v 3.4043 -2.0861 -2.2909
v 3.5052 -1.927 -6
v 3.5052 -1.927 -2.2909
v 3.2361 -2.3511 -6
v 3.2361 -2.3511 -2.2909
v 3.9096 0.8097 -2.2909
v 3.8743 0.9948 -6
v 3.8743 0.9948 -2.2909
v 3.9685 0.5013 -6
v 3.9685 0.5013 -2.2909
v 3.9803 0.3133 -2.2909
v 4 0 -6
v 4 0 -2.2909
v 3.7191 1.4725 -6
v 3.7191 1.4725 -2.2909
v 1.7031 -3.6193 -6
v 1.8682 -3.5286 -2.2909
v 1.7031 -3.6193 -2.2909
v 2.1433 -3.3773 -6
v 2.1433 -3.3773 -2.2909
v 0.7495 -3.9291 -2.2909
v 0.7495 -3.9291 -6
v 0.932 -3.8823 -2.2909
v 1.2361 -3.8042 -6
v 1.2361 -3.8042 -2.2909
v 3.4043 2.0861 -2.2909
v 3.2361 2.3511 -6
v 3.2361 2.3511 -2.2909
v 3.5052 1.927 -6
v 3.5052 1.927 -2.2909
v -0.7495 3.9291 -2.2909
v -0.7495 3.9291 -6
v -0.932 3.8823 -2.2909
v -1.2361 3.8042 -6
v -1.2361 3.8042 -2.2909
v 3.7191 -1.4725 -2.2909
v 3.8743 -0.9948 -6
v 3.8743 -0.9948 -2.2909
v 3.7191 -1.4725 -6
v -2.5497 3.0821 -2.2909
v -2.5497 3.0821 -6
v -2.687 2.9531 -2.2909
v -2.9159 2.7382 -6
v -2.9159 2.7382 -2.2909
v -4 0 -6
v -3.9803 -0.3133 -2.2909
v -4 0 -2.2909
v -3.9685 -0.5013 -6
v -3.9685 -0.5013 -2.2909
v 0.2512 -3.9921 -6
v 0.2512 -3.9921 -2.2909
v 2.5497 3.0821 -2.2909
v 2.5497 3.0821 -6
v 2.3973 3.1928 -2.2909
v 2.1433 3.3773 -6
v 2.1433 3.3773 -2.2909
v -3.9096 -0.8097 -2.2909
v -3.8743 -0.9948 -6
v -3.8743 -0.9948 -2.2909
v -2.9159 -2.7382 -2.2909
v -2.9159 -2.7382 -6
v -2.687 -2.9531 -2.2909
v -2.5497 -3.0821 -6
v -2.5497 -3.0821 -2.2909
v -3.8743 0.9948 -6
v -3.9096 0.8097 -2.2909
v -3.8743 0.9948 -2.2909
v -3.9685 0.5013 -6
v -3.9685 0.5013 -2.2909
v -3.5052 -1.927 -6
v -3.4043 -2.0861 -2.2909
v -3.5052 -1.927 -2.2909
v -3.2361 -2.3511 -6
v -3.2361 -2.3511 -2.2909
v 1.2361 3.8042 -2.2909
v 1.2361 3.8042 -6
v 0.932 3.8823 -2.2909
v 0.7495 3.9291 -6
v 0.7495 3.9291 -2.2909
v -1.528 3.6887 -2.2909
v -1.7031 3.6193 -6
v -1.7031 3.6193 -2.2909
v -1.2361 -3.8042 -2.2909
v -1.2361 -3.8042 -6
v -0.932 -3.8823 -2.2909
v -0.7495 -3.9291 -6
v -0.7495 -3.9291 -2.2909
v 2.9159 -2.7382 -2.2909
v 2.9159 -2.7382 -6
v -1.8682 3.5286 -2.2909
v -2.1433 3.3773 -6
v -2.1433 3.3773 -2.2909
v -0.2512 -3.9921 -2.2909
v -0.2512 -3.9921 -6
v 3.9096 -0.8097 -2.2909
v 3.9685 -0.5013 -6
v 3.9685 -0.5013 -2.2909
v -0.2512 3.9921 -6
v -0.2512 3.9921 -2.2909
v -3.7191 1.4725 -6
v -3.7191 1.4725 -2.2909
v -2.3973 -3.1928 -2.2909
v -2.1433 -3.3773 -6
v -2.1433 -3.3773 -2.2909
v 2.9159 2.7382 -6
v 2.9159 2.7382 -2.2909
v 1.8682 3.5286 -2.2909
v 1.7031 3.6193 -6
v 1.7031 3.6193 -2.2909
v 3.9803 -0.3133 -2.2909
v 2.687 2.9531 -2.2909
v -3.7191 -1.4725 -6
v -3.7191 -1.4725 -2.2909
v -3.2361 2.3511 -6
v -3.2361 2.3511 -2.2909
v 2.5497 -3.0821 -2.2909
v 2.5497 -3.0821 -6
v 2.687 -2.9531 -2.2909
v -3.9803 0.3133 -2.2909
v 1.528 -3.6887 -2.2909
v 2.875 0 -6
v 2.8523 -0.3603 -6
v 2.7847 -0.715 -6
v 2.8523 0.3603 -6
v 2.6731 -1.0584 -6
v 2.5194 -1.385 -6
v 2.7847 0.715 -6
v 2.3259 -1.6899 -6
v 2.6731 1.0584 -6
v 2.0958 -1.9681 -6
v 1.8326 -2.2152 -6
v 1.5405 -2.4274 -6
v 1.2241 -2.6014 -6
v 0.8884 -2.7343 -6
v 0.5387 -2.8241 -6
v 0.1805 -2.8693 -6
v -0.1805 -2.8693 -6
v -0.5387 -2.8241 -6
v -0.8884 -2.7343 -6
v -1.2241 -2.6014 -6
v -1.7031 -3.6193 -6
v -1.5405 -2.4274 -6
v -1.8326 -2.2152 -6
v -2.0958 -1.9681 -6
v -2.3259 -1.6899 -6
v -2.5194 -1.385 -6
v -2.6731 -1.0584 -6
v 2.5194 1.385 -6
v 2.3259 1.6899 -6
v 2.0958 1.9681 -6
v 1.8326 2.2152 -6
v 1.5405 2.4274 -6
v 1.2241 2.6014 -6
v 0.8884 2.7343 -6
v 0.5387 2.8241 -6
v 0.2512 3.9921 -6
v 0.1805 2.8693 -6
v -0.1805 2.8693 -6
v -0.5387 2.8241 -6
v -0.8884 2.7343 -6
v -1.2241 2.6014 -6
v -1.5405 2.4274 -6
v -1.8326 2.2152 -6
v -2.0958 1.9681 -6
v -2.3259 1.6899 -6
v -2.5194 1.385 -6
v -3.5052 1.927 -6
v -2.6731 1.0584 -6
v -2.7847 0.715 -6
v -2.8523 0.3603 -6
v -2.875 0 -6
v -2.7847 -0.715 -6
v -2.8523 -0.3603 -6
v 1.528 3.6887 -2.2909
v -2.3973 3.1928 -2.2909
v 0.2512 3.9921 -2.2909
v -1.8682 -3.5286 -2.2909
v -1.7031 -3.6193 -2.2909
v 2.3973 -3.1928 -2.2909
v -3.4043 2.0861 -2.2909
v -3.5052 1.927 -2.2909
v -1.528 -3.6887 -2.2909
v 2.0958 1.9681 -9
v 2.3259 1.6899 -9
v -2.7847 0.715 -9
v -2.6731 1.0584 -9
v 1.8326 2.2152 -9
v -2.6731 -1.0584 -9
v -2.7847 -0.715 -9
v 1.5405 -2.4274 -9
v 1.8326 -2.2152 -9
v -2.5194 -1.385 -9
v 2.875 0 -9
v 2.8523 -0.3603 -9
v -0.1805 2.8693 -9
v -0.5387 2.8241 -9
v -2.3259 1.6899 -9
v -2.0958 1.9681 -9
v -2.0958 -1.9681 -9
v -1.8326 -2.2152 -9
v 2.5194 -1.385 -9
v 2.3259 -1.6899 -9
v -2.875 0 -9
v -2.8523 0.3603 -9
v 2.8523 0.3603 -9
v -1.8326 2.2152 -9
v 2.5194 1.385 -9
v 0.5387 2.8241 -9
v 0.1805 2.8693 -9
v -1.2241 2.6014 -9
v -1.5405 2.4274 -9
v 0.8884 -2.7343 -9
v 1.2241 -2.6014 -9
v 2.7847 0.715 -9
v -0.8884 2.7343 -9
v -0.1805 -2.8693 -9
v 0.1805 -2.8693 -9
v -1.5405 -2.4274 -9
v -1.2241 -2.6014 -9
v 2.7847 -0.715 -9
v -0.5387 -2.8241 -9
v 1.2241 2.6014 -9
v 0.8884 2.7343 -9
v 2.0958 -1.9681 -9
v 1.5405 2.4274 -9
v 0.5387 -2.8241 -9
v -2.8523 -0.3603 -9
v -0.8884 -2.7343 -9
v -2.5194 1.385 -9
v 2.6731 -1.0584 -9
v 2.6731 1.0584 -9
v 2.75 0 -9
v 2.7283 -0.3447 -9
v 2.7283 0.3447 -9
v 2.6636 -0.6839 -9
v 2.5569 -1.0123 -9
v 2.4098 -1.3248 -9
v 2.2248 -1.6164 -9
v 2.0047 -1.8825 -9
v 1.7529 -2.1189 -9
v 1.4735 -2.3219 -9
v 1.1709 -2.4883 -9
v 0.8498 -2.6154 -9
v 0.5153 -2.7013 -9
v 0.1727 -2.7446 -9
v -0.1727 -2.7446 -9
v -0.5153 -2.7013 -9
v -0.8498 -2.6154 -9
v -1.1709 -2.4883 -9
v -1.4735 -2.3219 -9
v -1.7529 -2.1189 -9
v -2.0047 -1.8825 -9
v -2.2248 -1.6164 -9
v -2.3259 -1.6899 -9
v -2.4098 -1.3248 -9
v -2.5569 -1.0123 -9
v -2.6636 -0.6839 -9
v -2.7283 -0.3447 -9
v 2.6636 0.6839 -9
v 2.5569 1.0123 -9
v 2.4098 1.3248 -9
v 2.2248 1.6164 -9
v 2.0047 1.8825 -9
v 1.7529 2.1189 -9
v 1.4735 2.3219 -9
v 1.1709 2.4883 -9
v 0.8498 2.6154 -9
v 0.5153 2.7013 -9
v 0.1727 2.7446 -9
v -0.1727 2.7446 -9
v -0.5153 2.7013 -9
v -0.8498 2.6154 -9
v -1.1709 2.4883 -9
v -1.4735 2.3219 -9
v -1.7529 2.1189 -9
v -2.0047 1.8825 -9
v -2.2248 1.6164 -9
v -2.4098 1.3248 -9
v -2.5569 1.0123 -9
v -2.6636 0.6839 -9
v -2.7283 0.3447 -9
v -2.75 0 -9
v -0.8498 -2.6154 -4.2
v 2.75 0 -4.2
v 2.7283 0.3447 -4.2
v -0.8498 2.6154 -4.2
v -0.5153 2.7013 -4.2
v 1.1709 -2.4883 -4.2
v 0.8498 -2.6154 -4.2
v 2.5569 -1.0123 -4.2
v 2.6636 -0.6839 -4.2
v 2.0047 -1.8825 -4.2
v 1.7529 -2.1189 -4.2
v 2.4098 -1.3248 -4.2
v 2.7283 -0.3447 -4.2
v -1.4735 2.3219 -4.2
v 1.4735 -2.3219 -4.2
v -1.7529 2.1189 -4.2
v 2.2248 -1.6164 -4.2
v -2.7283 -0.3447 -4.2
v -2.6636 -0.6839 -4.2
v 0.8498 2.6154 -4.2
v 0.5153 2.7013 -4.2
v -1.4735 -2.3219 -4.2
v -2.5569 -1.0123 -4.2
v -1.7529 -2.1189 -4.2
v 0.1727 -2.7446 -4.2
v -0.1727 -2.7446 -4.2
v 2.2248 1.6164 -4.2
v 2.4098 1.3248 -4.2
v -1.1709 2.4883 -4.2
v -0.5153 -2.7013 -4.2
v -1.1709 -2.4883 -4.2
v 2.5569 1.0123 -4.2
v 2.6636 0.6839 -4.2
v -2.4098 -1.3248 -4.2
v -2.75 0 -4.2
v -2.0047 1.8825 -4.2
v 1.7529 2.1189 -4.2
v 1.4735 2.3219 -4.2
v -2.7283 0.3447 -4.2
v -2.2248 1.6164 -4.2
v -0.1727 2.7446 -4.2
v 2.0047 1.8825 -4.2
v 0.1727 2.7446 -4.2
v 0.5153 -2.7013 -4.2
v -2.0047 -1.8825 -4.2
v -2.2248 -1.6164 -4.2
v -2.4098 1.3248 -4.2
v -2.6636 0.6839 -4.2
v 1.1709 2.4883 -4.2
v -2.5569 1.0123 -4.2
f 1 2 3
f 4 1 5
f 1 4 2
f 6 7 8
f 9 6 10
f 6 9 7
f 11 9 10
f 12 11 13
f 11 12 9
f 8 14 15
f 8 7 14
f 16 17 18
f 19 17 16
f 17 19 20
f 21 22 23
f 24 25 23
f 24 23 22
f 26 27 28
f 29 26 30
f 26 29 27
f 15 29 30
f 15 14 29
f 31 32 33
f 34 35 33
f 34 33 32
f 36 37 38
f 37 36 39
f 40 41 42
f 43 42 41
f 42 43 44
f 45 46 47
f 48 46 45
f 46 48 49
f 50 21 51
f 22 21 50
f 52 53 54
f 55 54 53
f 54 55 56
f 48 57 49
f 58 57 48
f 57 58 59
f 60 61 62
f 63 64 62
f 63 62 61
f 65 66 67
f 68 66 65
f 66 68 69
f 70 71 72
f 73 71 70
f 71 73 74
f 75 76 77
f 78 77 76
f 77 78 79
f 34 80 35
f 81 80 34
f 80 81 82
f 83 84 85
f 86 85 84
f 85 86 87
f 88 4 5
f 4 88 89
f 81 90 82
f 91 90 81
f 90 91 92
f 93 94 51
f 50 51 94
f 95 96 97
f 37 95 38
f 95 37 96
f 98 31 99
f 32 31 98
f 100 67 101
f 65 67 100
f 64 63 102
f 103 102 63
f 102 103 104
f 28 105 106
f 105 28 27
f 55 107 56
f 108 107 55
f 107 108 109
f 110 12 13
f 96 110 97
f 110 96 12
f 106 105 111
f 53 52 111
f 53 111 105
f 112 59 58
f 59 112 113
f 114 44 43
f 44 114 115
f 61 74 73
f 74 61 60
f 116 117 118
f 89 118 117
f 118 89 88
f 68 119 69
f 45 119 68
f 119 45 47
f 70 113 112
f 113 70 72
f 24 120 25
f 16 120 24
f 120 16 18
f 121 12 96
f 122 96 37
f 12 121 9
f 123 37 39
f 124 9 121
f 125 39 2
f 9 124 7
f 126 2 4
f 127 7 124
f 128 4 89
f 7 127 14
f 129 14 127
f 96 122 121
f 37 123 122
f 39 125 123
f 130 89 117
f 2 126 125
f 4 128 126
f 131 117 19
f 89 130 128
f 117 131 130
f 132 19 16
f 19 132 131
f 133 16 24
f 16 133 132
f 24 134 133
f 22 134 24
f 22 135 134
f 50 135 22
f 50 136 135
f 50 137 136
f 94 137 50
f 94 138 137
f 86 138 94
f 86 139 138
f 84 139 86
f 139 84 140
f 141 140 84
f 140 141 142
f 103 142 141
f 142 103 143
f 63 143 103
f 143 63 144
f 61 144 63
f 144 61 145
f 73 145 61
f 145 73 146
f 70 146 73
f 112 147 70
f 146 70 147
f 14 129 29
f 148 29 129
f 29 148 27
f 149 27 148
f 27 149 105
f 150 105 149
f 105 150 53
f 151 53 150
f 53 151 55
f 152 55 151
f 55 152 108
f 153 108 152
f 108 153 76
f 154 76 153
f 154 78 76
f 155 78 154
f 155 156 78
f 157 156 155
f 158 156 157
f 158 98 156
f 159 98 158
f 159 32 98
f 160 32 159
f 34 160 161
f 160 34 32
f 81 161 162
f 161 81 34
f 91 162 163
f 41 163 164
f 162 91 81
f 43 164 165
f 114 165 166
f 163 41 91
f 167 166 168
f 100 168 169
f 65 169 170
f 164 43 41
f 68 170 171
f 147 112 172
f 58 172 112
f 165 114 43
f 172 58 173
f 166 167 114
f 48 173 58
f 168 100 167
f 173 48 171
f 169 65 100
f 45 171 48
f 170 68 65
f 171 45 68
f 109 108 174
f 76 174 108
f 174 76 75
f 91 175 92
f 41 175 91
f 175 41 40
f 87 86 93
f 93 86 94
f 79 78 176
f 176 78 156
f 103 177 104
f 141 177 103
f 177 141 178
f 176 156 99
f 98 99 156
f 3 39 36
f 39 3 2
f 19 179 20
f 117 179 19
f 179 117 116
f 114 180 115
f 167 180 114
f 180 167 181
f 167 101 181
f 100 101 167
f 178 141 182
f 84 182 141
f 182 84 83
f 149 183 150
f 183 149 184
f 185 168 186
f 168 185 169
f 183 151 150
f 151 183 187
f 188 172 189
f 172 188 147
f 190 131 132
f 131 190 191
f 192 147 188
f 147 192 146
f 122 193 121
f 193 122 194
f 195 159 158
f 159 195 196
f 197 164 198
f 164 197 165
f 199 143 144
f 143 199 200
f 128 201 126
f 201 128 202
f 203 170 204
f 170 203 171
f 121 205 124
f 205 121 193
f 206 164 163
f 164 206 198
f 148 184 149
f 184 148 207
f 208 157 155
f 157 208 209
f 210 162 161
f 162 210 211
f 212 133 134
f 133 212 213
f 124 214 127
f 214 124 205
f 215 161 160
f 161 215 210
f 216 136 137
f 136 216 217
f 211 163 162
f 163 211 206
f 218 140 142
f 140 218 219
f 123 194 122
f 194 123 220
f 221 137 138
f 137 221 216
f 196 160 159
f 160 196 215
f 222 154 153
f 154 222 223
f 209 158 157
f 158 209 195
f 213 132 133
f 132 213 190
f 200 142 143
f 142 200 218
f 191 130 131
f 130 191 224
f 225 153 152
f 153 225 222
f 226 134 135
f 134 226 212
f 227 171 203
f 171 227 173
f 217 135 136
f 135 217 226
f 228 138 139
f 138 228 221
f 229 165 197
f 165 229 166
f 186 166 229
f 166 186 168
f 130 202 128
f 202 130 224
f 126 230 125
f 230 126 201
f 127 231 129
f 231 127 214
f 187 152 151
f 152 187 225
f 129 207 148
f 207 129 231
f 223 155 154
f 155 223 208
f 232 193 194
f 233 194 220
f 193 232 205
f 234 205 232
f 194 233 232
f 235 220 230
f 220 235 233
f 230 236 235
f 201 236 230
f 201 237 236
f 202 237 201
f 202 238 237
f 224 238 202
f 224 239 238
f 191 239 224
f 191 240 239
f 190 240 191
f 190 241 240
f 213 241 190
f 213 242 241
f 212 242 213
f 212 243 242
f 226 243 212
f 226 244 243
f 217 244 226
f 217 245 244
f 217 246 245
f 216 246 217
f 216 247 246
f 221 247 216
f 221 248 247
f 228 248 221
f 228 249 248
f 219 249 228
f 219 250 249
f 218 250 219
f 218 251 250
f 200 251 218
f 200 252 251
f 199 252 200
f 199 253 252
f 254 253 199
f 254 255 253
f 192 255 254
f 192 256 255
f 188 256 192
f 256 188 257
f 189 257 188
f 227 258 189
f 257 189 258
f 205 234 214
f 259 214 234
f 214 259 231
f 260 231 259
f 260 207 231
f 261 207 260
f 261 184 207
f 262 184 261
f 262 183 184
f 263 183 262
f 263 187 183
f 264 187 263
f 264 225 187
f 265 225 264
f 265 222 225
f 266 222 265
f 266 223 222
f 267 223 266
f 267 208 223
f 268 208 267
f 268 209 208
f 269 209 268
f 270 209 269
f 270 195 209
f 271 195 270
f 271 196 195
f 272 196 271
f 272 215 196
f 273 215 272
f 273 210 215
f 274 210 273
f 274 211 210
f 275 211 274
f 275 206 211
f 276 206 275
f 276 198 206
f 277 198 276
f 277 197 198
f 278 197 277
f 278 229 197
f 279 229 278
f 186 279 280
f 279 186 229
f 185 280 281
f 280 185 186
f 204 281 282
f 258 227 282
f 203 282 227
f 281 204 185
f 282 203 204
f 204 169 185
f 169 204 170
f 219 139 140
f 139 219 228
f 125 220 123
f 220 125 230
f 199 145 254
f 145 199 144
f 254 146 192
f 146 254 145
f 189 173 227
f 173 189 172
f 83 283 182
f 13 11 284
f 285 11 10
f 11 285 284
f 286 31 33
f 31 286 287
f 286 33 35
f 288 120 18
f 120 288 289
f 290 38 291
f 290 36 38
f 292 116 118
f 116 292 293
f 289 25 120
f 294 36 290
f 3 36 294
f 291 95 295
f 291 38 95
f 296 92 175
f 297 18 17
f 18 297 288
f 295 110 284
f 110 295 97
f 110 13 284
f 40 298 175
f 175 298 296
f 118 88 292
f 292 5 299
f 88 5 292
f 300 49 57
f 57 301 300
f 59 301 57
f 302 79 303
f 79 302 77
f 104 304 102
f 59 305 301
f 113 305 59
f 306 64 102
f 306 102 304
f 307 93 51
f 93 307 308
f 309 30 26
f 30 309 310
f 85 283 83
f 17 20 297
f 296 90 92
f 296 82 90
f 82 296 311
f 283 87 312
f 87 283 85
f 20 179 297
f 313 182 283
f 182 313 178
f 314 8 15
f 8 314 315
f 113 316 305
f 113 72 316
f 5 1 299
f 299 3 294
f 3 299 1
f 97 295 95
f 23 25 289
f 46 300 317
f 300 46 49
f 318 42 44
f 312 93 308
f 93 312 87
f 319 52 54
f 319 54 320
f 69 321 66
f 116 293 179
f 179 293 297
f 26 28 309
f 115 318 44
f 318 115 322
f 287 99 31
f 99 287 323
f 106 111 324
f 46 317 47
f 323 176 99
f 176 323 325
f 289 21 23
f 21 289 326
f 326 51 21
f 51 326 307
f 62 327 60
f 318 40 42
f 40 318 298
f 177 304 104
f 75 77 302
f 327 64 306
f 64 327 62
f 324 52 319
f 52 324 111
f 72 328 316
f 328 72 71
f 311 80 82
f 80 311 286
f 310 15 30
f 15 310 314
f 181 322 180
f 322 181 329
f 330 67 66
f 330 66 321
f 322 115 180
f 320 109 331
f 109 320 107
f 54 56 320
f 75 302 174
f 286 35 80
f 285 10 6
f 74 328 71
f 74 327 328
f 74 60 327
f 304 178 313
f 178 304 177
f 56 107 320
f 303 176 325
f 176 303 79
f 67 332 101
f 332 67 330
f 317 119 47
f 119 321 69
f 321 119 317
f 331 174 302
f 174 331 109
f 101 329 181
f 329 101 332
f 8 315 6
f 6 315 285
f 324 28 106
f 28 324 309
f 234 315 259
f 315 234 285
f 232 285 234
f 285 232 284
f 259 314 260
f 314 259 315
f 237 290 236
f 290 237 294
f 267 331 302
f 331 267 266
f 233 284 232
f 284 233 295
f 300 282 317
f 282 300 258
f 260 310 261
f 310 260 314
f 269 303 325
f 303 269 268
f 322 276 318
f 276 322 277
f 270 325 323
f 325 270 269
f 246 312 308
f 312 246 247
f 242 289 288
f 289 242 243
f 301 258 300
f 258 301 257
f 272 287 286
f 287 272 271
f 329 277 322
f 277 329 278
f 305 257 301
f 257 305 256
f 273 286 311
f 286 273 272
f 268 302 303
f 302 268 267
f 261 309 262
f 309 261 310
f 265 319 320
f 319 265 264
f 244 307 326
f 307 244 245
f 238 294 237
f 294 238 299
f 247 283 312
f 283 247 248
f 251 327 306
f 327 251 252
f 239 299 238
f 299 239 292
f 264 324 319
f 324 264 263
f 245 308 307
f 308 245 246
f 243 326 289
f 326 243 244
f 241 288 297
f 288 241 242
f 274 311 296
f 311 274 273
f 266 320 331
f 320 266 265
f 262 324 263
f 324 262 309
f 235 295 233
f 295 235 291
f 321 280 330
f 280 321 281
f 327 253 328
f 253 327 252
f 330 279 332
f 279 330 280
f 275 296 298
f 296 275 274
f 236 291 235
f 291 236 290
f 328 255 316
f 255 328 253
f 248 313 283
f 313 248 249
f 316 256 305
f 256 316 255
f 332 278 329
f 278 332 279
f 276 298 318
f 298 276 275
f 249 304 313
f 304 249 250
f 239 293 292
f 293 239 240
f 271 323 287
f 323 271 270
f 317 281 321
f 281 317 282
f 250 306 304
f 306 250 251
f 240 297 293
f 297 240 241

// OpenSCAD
$fn = 50;

difference() {
	union() {
		translate(v = [0, 0, -6.0]) {
			cylinder(h = 9, r = 4.0);
		}
		#translate(v = [0, 0, -9.0]) {
			cylinder(h = 9, r = 2.875);
		}
	}
	union() {
		translate(v = [0, 0, 0]) {
			rotate(a = [0, 0, 0]) {
				difference() {
					union() {
						translate(v = [0, 0, -9.0]) {
							cylinder(h = 9, r = 2.25);
						}
						translate(v = [0, 0, -4.2]) {
							cylinder(h = 4.2, r1 = 2.75, r2 = 5.5);
						}
						translate(v = [0, 0, -9.0]) {
							cylinder(h = 9, r = 2.75);
						}
						translate(v = [0, 0, -9.0]) {
							cylinder(h = 9, r = 2.25);
						}
					}
					union();
				}
			}
		}
		#cylinder(h = 3, r = 6.25);
	}
}
